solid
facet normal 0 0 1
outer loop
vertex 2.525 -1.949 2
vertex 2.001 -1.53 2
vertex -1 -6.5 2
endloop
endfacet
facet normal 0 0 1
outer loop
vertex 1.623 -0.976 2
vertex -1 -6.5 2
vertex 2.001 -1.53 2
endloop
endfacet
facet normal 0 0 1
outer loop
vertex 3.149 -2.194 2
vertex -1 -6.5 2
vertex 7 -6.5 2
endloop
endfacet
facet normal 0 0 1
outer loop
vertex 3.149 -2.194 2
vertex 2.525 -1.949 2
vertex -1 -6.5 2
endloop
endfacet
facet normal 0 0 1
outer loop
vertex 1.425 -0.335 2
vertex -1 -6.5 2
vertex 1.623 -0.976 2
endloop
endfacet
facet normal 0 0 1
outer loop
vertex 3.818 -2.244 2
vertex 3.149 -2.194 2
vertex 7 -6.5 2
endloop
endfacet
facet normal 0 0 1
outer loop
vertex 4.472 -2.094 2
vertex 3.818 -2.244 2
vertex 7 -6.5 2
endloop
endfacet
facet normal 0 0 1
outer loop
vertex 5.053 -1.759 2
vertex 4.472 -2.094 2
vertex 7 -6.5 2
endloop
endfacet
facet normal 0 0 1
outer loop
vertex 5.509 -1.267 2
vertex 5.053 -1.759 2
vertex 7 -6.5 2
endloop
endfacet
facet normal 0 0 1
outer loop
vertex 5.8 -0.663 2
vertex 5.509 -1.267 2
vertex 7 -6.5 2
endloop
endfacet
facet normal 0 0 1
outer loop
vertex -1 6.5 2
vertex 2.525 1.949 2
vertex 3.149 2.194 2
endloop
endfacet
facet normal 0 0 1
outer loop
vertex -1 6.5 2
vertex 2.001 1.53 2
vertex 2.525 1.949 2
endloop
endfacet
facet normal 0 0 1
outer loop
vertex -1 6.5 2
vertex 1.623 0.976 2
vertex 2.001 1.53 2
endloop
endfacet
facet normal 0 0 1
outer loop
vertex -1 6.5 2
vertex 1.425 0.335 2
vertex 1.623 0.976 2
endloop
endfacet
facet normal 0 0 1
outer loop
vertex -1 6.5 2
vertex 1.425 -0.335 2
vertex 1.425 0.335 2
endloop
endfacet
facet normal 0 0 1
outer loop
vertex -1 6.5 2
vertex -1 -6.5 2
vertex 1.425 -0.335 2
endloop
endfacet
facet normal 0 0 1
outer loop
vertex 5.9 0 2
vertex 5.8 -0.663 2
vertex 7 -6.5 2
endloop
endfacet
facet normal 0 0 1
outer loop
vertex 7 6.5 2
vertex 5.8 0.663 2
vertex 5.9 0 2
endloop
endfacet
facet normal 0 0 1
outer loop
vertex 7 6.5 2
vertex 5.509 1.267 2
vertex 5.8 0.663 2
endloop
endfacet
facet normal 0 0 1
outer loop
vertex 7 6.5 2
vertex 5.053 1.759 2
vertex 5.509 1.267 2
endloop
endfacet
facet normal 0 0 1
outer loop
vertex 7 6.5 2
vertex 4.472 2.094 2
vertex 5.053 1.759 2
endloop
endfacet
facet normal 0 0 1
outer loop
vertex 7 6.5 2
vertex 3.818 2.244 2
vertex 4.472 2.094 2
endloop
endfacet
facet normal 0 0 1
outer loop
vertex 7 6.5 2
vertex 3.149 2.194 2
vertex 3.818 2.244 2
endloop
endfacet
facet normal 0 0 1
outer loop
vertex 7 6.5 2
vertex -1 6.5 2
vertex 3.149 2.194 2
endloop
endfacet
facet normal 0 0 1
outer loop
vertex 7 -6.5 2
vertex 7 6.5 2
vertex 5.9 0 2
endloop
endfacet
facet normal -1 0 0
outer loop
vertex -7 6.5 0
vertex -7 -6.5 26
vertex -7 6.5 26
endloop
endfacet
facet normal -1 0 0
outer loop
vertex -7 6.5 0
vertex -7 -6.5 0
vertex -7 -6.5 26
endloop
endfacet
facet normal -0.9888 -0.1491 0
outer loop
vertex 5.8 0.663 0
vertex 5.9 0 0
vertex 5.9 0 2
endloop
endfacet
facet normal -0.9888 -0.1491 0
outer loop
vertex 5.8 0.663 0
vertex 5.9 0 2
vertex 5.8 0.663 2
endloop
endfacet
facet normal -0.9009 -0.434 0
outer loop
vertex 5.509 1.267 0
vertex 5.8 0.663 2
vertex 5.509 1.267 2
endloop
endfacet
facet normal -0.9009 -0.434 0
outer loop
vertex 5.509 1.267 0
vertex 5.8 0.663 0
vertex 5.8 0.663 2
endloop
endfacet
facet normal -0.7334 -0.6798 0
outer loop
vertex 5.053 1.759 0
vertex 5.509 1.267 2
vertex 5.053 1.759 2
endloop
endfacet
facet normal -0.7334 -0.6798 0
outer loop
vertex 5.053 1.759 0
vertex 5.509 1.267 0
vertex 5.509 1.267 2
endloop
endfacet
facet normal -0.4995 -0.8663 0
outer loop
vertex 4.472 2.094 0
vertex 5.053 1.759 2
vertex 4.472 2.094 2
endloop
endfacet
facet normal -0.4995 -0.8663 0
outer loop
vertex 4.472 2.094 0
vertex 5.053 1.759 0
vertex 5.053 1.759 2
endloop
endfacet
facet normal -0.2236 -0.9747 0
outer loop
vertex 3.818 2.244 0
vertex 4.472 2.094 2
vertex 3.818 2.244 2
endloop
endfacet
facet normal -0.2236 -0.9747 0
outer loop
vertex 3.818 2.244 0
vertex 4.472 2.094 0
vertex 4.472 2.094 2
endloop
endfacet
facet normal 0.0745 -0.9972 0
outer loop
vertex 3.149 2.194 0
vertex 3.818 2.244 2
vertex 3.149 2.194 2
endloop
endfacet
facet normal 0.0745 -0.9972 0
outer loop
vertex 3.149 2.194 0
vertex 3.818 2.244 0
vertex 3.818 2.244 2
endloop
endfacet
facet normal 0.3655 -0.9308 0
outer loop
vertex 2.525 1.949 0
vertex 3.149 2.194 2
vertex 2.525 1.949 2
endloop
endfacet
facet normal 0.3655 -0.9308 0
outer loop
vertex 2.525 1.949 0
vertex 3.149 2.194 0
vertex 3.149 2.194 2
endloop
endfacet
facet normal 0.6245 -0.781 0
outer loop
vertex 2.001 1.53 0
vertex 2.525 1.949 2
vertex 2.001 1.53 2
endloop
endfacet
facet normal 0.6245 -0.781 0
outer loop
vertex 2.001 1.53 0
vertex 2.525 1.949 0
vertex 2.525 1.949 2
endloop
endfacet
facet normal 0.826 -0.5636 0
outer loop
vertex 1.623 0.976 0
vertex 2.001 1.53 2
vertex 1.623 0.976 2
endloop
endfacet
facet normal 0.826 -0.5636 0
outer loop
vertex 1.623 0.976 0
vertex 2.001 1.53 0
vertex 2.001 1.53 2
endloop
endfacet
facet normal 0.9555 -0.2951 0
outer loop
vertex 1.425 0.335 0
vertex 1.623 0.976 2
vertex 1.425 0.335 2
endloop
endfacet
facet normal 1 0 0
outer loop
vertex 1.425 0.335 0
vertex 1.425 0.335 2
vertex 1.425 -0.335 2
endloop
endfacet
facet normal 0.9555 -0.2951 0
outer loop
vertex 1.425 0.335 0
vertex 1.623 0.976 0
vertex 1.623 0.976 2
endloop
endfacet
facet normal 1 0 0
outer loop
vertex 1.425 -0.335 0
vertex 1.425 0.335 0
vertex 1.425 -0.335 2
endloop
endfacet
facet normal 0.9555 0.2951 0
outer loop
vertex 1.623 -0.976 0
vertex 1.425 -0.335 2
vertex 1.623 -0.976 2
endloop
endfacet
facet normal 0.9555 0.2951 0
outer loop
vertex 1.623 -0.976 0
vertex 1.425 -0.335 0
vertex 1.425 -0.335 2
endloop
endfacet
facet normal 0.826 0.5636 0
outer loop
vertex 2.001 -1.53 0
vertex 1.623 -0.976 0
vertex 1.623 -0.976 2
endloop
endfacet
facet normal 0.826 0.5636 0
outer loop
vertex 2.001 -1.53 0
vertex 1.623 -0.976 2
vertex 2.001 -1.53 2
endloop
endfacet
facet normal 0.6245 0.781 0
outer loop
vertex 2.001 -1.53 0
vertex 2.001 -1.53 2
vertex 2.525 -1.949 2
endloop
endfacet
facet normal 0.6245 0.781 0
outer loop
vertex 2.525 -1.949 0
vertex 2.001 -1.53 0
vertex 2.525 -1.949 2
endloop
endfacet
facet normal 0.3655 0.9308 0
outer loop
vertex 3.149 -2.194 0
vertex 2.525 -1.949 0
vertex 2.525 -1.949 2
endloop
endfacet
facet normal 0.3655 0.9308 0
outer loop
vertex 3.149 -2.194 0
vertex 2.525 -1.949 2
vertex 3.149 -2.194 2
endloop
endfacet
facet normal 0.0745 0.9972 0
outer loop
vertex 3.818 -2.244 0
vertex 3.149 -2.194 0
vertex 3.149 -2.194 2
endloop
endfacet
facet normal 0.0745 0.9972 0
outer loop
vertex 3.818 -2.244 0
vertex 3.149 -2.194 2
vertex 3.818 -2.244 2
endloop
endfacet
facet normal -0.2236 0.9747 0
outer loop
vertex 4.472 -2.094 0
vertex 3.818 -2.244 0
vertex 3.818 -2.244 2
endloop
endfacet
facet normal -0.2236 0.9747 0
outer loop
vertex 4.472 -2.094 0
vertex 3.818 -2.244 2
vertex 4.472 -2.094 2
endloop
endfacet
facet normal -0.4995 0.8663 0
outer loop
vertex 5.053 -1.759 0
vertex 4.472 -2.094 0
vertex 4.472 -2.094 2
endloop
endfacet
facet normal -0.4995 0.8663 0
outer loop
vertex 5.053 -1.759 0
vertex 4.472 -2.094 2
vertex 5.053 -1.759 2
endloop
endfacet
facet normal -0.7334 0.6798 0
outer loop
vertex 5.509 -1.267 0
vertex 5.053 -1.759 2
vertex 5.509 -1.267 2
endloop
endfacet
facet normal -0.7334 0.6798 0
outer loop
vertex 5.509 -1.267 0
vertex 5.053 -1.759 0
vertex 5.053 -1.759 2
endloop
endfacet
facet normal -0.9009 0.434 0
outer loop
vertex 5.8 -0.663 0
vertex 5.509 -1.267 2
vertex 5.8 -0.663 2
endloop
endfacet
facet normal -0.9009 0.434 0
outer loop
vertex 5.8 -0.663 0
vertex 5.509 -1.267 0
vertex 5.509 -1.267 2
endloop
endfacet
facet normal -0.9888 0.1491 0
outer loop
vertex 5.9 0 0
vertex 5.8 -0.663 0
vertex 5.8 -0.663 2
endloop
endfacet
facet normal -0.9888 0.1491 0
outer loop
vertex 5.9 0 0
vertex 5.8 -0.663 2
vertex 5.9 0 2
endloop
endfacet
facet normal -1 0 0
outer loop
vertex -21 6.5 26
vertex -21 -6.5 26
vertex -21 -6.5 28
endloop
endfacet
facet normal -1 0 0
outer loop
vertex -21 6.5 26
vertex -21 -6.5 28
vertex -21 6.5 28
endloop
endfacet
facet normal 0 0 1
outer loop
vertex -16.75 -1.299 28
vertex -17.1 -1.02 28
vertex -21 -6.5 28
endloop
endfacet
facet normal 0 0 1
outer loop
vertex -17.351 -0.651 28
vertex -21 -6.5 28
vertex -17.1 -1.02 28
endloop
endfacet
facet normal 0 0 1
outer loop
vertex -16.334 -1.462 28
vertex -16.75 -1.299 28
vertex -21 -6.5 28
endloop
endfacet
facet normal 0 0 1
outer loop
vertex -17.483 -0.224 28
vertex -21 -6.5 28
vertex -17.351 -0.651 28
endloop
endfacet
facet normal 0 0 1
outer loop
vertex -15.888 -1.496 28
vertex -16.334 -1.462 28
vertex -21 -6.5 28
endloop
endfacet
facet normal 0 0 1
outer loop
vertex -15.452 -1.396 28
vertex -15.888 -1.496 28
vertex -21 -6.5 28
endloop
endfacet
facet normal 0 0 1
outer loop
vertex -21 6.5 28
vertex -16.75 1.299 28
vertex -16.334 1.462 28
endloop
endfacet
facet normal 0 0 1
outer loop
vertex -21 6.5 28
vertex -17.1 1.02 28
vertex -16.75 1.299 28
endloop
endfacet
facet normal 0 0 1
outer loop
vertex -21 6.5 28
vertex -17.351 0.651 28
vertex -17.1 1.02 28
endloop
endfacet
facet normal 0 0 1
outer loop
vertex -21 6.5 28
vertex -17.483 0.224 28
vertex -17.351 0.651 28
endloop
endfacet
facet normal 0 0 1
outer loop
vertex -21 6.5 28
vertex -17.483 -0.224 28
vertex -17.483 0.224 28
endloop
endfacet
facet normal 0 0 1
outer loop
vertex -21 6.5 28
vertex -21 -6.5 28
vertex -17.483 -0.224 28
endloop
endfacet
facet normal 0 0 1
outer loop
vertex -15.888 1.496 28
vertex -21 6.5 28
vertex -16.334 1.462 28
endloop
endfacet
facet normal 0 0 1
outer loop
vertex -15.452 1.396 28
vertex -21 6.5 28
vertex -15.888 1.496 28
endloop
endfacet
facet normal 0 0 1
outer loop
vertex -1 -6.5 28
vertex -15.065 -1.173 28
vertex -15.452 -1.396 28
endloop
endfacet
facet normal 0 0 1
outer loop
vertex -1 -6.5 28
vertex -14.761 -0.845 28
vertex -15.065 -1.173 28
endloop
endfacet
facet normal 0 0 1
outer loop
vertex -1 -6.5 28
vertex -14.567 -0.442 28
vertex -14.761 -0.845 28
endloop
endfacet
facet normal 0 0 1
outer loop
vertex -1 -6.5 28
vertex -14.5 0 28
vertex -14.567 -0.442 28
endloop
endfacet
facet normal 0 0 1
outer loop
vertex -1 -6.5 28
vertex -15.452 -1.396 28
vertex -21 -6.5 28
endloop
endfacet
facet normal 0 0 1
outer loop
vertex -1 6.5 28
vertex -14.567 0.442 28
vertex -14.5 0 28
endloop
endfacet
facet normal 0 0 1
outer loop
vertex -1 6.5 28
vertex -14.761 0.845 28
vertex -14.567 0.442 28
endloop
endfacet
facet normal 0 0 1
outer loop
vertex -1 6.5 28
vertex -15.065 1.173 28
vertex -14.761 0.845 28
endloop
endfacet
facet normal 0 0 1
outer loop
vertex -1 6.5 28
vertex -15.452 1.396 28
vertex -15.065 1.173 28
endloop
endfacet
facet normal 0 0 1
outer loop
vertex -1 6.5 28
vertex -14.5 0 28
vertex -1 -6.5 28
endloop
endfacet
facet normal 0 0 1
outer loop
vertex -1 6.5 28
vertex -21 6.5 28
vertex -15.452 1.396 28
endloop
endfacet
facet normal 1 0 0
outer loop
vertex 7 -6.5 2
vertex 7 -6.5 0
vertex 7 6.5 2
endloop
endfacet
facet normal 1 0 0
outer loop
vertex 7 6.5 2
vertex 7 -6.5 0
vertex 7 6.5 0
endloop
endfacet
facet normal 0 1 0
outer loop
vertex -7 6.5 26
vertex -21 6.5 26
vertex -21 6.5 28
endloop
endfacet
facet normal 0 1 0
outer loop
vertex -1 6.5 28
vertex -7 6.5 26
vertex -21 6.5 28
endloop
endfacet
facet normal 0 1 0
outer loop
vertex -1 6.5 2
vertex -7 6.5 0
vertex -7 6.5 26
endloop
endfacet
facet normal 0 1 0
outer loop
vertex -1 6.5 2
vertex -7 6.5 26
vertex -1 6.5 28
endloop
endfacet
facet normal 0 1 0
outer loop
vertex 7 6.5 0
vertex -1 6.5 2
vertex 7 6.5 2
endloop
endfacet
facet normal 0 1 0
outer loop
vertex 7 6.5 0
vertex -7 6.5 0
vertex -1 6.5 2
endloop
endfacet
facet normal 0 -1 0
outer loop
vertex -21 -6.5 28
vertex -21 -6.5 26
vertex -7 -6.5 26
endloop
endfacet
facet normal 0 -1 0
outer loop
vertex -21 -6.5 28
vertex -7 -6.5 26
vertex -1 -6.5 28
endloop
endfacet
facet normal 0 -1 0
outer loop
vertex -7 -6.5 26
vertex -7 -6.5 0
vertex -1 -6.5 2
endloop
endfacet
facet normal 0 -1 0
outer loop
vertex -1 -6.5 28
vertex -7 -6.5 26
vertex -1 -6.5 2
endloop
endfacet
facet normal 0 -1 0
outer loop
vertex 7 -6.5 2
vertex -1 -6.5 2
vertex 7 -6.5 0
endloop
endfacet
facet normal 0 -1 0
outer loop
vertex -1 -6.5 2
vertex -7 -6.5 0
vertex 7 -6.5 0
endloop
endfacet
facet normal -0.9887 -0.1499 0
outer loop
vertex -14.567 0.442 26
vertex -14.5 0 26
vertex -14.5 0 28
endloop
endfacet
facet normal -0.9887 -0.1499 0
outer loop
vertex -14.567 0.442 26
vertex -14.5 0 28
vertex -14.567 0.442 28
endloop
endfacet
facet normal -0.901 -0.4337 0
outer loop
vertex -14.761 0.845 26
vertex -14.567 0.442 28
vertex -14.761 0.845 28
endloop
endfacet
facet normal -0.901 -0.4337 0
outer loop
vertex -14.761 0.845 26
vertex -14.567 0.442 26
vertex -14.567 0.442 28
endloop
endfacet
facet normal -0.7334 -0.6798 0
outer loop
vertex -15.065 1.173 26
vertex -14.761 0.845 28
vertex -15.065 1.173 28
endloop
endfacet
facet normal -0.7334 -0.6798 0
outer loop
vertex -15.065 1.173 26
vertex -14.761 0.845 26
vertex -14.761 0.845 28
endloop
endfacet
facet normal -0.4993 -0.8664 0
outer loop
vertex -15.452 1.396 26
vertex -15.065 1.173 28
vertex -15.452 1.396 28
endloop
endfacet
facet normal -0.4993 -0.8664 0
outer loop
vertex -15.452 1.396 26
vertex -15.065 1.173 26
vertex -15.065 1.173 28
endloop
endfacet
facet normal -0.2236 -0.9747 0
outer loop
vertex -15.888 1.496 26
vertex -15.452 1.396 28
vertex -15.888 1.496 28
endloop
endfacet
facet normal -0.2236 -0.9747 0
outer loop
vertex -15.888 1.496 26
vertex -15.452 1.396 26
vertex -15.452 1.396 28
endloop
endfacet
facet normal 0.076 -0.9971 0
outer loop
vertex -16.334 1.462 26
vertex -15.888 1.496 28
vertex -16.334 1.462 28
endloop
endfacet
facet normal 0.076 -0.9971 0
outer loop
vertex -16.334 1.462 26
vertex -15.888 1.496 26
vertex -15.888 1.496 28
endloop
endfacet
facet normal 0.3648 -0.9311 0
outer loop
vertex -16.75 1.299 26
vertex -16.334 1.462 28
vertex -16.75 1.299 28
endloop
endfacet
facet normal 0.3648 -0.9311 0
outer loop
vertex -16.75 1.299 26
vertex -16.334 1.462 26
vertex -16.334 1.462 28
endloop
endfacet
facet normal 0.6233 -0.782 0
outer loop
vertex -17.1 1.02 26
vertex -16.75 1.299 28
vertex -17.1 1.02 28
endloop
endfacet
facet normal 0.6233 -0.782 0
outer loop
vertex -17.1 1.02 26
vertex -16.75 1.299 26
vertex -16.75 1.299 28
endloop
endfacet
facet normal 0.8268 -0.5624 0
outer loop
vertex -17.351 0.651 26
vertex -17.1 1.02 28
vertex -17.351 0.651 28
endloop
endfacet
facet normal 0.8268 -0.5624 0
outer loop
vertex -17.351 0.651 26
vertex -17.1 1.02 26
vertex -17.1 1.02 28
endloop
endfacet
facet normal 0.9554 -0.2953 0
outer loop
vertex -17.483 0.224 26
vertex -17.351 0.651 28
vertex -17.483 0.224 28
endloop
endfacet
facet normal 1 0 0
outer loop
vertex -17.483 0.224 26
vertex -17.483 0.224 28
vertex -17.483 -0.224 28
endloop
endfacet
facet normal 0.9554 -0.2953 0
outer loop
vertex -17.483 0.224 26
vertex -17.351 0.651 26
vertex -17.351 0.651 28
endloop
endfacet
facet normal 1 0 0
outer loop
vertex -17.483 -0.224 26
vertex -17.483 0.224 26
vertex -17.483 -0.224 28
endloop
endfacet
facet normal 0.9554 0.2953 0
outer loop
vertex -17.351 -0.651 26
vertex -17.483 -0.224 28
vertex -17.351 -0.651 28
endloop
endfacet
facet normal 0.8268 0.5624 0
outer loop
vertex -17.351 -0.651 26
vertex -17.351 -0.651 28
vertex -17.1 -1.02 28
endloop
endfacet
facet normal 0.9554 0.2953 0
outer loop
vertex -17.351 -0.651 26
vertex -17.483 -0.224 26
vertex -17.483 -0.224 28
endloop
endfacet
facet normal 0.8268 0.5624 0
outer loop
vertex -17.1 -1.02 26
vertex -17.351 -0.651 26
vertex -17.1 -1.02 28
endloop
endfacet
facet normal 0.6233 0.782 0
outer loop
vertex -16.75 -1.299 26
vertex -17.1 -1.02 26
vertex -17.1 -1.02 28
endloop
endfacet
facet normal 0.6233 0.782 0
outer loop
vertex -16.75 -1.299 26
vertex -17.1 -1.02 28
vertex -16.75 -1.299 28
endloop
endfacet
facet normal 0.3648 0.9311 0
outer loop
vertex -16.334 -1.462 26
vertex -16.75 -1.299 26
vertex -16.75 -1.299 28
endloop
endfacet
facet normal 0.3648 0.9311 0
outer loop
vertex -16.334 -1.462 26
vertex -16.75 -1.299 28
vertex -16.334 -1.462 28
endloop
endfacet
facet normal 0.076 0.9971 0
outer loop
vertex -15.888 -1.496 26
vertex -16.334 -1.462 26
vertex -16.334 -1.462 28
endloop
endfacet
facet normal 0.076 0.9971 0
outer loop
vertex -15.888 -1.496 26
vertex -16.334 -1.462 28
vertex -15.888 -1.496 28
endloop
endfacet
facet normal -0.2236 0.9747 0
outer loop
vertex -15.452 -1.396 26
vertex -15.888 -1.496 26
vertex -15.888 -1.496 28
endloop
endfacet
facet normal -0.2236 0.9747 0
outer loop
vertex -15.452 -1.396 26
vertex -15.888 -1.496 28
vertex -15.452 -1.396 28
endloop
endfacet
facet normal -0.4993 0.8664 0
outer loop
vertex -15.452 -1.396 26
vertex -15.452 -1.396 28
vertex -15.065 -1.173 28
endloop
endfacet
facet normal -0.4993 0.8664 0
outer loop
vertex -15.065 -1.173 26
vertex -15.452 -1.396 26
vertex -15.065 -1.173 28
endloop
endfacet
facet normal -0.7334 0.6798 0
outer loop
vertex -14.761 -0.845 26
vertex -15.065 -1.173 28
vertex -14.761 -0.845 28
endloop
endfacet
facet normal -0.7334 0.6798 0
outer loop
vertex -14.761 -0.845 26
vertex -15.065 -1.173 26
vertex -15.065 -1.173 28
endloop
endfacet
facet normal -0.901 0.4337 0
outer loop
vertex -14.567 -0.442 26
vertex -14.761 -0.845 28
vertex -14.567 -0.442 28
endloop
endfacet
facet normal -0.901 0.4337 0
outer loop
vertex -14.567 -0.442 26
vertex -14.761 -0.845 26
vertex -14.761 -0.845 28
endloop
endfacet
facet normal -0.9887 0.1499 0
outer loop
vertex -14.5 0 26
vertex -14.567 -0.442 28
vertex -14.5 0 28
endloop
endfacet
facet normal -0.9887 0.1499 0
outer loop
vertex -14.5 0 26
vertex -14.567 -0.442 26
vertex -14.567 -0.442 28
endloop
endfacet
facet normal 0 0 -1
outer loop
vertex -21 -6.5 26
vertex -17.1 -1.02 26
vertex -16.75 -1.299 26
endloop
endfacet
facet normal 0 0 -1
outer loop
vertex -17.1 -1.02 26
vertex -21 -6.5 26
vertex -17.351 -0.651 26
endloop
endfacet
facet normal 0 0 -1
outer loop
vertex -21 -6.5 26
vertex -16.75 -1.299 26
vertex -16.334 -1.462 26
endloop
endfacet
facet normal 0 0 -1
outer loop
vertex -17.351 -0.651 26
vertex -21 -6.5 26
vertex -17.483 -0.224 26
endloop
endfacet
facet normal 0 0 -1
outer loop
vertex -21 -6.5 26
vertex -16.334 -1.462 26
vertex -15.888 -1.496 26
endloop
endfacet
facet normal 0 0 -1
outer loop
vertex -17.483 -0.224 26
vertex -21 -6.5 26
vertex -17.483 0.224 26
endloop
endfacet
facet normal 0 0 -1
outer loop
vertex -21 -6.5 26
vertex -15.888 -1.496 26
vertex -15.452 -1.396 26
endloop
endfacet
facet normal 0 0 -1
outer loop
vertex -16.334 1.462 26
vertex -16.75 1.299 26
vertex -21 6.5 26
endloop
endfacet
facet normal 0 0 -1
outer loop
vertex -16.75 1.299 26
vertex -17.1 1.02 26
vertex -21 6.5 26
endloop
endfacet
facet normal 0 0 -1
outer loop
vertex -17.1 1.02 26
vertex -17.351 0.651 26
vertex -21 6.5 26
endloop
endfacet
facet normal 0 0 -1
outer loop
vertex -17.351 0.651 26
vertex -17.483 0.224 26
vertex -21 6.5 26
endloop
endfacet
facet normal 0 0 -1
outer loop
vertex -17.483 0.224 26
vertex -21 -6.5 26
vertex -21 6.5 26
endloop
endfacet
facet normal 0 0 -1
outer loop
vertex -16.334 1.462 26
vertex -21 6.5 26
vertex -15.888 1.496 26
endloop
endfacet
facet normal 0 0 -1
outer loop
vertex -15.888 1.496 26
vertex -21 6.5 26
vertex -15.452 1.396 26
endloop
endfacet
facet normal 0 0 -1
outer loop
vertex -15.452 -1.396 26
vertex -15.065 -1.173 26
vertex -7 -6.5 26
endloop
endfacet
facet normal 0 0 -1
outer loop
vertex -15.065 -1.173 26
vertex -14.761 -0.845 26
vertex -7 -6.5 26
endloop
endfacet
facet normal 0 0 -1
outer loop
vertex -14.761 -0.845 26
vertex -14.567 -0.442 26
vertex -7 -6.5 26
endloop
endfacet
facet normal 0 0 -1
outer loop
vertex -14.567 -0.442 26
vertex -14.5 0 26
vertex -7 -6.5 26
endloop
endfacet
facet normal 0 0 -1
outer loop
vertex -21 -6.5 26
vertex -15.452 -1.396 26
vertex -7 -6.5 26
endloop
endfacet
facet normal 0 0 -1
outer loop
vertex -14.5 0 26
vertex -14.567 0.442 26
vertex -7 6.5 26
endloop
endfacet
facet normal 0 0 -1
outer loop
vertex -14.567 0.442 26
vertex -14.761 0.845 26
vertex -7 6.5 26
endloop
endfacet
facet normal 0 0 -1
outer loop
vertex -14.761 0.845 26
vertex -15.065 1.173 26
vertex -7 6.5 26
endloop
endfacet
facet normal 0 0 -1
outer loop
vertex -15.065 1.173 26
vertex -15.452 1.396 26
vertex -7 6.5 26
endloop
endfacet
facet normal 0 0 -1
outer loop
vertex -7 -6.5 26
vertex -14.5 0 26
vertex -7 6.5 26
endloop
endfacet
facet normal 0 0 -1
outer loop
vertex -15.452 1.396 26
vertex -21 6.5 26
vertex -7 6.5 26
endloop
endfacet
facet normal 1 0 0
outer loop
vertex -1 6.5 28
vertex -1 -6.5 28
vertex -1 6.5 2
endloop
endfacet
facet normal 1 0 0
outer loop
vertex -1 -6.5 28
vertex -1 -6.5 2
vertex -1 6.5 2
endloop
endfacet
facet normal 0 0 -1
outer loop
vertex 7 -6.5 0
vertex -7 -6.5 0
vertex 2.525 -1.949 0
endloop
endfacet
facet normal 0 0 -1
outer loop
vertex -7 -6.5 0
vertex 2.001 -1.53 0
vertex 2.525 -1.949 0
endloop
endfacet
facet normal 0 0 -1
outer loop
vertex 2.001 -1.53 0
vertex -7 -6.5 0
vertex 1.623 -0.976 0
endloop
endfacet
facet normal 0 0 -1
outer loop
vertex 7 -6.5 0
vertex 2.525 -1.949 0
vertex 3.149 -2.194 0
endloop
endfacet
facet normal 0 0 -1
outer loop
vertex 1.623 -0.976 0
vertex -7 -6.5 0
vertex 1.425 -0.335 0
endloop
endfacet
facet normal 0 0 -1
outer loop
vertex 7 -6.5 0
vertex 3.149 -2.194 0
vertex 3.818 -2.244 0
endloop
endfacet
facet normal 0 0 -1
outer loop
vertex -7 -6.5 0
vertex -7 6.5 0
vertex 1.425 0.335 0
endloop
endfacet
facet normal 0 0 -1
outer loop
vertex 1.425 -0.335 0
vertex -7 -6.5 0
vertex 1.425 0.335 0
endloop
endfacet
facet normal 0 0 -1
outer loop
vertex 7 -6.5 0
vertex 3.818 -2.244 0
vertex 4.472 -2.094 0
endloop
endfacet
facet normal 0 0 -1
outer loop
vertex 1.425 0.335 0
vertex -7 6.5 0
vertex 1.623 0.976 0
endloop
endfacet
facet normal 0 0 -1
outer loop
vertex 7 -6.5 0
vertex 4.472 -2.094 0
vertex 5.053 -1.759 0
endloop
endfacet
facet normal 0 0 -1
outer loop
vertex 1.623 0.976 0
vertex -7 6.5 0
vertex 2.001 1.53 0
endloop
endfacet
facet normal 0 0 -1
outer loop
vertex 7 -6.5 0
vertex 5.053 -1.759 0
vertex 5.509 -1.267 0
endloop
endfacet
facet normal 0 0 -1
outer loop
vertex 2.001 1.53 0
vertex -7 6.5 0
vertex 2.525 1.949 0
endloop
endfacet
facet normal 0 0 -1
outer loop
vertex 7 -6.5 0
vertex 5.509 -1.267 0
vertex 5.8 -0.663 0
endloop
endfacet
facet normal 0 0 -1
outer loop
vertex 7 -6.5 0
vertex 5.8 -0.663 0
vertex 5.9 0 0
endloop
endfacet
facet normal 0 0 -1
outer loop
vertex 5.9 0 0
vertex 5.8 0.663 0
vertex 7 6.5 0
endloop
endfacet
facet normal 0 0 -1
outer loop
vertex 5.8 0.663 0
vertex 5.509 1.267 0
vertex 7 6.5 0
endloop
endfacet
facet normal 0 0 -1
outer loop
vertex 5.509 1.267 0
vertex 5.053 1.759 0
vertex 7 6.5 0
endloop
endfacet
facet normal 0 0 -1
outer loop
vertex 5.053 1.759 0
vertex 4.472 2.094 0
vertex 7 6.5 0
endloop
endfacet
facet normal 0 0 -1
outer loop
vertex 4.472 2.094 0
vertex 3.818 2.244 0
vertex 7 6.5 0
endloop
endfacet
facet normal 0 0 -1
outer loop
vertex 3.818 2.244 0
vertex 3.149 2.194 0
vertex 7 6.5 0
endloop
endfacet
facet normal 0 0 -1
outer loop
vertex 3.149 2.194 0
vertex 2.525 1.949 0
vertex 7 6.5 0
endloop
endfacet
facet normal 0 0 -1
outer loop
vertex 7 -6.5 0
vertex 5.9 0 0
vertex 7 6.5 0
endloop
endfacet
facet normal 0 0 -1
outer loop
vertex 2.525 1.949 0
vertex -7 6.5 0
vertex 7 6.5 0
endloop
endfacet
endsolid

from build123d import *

# Parameters (mm, degrees)
SZKIC1_W                    = 14
SZKIC1_H                    = 13
SZKIC1_R                    = 2.25
DODANIE_WYCI_GNI_CIE1_DEPTH = 2
SZKIC2_W                    = 6
SZKIC2_H                    = 13
DODANIE_WYCI_GNI_CIE2_DEPTH = 24
SZKIC3_W                    = 20
SZKIC3_H                    = 13
SZKIC3_R                    = 1.5
DODANIE_WYCI_GNI_CIE3_DEPTH = 2


with BuildPart() as part:
    # Szkic1 → Dodanie-wyciągnięcie1 (new body)
    with BuildSketch(Plane.XY):
        Rectangle(SZKIC1_W, SZKIC1_H)
        with Locations((3.65, 0)):
            Circle(SZKIC1_R, mode=Mode.SUBTRACT)
    extrude(amount=DODANIE_WYCI_GNI_CIE1_DEPTH)

    # Szkic2 → Dodanie-wyciągnięcie2 (add)
    with BuildSketch(Plane.XY.offset(2)):
        with Locations((-4, 0)):
            Rectangle(SZKIC2_W, SZKIC2_H)
    extrude(amount=DODANIE_WYCI_GNI_CIE2_DEPTH)

    # Szkic3 → Dodanie-wyciągnięcie3 (add)
    with BuildSketch(Plane.XY.offset(26)):
        with Locations((-11, 0)):
            Rectangle(SZKIC3_W, SZKIC3_H)
        with Locations((-16, 0)):
            Circle(SZKIC3_R, mode=Mode.SUBTRACT)
    extrude(amount=DODANIE_WYCI_GNI_CIE3_DEPTH)


solid = part.part
